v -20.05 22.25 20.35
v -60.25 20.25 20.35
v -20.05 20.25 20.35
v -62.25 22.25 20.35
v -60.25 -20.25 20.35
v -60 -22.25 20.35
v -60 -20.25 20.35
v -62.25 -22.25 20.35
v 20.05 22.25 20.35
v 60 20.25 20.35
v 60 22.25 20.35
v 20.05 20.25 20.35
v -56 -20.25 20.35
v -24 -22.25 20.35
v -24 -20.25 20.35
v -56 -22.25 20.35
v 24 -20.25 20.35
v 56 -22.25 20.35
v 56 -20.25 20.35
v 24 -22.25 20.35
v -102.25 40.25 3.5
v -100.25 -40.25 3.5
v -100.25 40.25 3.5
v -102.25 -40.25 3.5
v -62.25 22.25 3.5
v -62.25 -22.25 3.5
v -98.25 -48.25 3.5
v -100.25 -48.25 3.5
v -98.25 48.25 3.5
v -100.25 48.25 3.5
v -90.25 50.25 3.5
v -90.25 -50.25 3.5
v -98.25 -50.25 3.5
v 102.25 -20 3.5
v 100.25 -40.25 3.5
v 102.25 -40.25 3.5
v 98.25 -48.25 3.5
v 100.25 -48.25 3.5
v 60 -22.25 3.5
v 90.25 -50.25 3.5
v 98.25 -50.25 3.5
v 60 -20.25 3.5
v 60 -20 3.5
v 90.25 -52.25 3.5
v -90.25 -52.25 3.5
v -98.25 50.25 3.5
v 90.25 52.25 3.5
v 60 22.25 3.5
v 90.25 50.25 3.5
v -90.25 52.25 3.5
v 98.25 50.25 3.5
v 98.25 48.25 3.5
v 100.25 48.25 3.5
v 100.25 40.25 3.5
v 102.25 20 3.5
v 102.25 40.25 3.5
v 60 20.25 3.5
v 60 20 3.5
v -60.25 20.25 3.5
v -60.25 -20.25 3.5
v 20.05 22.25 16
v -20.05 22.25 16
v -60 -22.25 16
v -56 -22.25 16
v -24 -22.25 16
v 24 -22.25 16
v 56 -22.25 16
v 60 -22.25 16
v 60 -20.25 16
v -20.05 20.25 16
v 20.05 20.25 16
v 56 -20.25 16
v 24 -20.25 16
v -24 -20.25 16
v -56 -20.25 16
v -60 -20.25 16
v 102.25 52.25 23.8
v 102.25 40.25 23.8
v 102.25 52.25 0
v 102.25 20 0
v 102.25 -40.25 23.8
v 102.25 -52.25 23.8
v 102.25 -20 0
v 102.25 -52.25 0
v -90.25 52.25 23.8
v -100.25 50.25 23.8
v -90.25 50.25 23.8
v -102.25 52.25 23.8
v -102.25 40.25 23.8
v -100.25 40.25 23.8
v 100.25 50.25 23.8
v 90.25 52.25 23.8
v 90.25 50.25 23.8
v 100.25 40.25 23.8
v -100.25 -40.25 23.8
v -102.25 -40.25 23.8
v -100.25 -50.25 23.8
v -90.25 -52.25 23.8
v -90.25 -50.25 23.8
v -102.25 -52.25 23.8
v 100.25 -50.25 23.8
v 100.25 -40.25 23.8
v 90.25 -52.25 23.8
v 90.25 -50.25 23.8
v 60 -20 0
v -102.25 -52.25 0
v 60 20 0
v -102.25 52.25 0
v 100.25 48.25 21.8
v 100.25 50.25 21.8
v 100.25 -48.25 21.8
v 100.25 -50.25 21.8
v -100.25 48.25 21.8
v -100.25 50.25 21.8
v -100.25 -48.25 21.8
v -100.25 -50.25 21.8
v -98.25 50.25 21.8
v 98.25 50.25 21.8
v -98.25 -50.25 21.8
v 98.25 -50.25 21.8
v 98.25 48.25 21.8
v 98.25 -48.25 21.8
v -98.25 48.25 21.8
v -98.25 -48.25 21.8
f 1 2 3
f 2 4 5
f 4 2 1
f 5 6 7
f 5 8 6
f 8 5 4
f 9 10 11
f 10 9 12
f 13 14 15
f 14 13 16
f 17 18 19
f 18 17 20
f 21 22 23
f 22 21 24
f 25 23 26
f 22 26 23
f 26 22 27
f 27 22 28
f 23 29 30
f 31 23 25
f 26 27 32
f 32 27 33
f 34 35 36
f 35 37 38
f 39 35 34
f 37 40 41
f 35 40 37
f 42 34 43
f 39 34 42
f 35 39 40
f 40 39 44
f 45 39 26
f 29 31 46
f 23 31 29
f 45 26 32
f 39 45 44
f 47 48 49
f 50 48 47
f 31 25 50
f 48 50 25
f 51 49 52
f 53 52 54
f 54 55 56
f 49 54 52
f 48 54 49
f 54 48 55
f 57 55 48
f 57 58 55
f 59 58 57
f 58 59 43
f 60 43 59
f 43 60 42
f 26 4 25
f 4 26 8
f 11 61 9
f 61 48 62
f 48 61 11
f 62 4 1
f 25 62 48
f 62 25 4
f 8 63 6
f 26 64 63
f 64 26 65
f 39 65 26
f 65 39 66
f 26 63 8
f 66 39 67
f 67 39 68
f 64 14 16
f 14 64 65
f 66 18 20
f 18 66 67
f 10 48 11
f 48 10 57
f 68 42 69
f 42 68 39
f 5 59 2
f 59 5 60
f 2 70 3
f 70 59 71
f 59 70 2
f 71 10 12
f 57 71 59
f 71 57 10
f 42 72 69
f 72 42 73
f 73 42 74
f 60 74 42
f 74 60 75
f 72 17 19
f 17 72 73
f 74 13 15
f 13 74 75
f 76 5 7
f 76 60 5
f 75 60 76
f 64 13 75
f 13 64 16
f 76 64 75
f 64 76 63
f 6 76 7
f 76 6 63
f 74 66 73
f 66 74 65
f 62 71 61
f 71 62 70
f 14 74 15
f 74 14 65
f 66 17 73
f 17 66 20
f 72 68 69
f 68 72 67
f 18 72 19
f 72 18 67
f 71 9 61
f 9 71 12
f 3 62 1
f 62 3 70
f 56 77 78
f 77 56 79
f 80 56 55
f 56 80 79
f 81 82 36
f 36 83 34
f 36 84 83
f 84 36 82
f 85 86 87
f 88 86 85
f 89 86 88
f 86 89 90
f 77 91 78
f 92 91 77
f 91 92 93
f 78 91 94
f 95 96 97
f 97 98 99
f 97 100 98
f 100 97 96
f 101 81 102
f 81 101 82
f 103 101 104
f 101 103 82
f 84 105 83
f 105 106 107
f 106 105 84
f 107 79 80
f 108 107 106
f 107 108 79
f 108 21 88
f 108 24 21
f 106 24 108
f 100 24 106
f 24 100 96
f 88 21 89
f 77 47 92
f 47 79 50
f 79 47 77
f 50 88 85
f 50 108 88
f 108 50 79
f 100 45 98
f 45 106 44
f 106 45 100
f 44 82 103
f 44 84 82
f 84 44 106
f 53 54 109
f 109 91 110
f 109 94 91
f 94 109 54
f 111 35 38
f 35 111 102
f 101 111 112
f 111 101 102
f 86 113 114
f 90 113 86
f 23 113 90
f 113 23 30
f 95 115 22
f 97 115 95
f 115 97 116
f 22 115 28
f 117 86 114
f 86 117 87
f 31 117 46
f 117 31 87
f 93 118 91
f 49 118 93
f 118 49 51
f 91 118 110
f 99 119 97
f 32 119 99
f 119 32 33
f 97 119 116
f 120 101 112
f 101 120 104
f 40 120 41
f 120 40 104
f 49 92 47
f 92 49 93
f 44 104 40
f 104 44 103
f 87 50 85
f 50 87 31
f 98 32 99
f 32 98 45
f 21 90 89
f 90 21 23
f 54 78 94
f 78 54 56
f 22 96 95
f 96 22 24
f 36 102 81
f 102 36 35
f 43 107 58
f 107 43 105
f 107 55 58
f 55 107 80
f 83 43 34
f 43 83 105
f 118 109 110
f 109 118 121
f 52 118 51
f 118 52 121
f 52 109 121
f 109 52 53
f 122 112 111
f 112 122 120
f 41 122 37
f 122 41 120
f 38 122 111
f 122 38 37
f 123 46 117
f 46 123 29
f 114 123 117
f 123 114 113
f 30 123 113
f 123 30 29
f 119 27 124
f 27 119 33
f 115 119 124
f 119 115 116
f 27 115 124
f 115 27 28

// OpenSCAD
// file: ../parameters.scad
//|==========================================|//
//|               CLOUD CHAMBER              |//
//|==========================================|//


//========== FUNCTIONS ==========//

//unit conversions
function inch_to_mm(inch) = inch*25.4;
function mm_to_inch(mm) = mm/25.4;


//========== SCREWS ==========//

//Screw diameter and nut for M10 [mm]
M10_screw_diameter=10.4;
M10_head_height = 10;
M10_head_diameter = 16+0.5;
M10_nut_height = 10.5;
M10_nut_diameter = 25.5;
M10_nut_pocket = 22.3;

//Screw diameter and nut for M8 [mm]
M8_screw_diameter = 8 + 1;
M8_head_height = 8;
M8_head_diameter = 13.5;
M8_nut_height = 7.5;
M8_nut_diameter = 14.4 + 0.5;
M8_nut_pocket = 13 + 0.5;

//Screw diameter and nut for M6 [mm]
M6_screw_diameter=6.5;
M6_head_diameter = 10+0.5;
M6_head_height = 6;
M6_nut_height = 4.9;
M6_nut_diameter = 11.8;
M6_nut_pocket = 10.4;

//Screw diameter and nut for M5 [mm]
M5_screw_diameter=5.5;
M5_head_height = 5;
M5_head_diameter = 13+0.5;
M5_nut_height = 4.5;
M5_nut_diameter = 9.4;
M5_nut_pocket = 8.4;

//Screw diameter and nut for M4 [mm]
M4_screw_diameter=4.5;
M4_screw_head_height = 4;
M4_nut_height = 3.2;
M4_nut_diameter = 8.4;
M4_nut_pocket = 7.5;

//Screw diameter and nut for M3 [mm]
M3_screw_diameter = 3.2;
M3_nut_height = 2.7;
M3_nut_diameter = 6.6;
M3_screw_head_height = 3;
M3_nut_pocket = 5.6;

//Screw diameter and nut for M2,5 [mm]
M2_5_screw_diameter = 2.7;
M2_5_nut_height = 2.3;
M2_5_nut_diameter = 6;
M2_5_nut_pocket = 5.1;


//========== CHAMBER ==========//

//observation_surface_x
observation_surface_x = 200.5;
observation_surface_y = 100.5;

//cooper block
cooper_block_x = 200;
cooper_block_y = 100;
cooper_block_thickness = 8;

//chamber frame
chamber_width = 400;
chamber_deepth = 350;
chamber_height = 250;

//service door
door_width = 200;

//peltiers
peltier_size_x = 40;
peltier_size_y = 40;
peltier_thickness = 2.9;
peltier_cable_diameter = 4;

//water ALU block
water_block_width = 40;
water_block_length = 120;
water_block_thickness = 12.5;

//hose
hose_outer_diameter = 10;
hose_inner_diameter = 8;

//nextion display 2.8"
nextion_board_width = 85;
nextion_board_height = 50;
nextion_board_thickness = 1.6;
nextion_display_width = 69.5;
nextion_display_height = 50;
nextion_thickness = 7;
nextion_screw_diameter = M2_5_screw_diameter;
nextion_screw_width_distance = 78.5;
nextion_screw_height_distance = 49;


//========== ALU PROFILES ==========//

//30x30 profile
ALU30_size = 30;
ALU30_groove = 8;

//20x20 profile
ALU20_size = 20;
ALU20_groove = 6;


//========== ELECTRONIC DEVICE ==========//

//TO-92 package
TO92_width = 4.6;
TO92_height = 4.6;
TO92_thickness = 3.9;
TO92_pins = 14.5;
TO92_bottom_to_pins = 1;


//========== COOLING CIRCUIT ==========//

//fitting
fitting_thread_diameter = 13.157;
fitting_thread_height = 4;
fitting_height = 14.5;
fitting_inner_diameter = 8.4;
fitting_bottom_inner_diameter = 10;
fitting_bottom_inner_height = 6;
fitting_wall_thickness = 0.8;
fitting_overhang_height = 5;
fitting_overhang_size = 1;
fitting_nut_diameter = 18;
fitting_nut_height = 3;
fitting_seal_thickness = 0.8;

//pump
pump_diameter = 70;
pump_height = 135;
pump_in_out_distance = 35;
pump_in_out_diameter = 20;
pump_in_out_height = 40;
pump_in_out_overlap = 2;
pump_cap_diameter = 16;
pump_cap_height = 2;
pump_cap_distance = 30;
pump_cap_inbus_diameter = 7;
pump_cap_inbus_height = 5;
pump_cap_angle = 35;
pump_tank_height = 60;
pump_tank_top_distance = 16;
pump_tank_furrow_height = 0.5;
pump_tank_furrow_deepth = 2;

//fan
fan_size = 120;
fan_thickness = 25;
fan_frame_thickness = 5;
fan_diameter = fan_size-2;
fan_center_diameter = 35;
fan_blade_count = 5;
fan_blade_center_size = 5;
fan_blade_outer_size = 45;
fan_blade_angle = 23;
fan_blade_thickness = 0.4;
fan_screw_diameter = M4_screw_diameter;
fan_screw_distance = 7;
fan_rotation = false;

//radiator
radiator_width = 392;
radiator_height = 120;
radiator_thickness = 27;
radiator_fpi = 16;
radiator_fin_thickness = 0.05;
radiator_frame_thickness = 2;
radiator_frame_overhang = 4;
radiator_frame_radius = 10;
radiator_fans_translate = 17-fan_screw_distance;
radiator_pipe_count = 12;
radiator_pipe_thickness = 2;
radiator_mount_height = 12;
radiator_mount_width = 31;
radiator_mount_thickness = 1;
// main file
include <../parameters.scad>

bottom_thickness = 3.5;
border_thickness = 2;
border_height = water_block_thickness+peltier_thickness*2+2;
border_corner_size = 10;
copper_plate_support = 2;
water_block_tolerance = 0.5;

module 1001_Pbk(peltiers=false) {
    if(peltiers==true) {
        translate([0, 0, bottom_thickness+water_block_thickness/2])
            #cube([water_block_length, water_block_width, water_block_thickness], center=true);

        translate([-water_block_length/2+peltier_size_x/2, 0, bottom_thickness+water_block_thickness+peltier_thickness])
            #cube([peltier_size_x, peltier_size_y, peltier_thickness*2], center=true);

        translate([water_block_length/2-peltier_size_x/2, 0, bottom_thickness+water_block_thickness+peltier_thickness])
            #cube([peltier_size_x, peltier_size_y, peltier_thickness*2], center=true);
    }

    translate([observation_surface_x/2-copper_plate_support, observation_surface_y/2-copper_plate_support, bottom_thickness])
        cube([copper_plate_support, copper_plate_support, water_block_thickness+peltier_thickness*2]);

    translate([observation_surface_x/2-copper_plate_support, -observation_surface_y/2, bottom_thickness])
        cube([copper_plate_support, copper_plate_support, water_block_thickness+peltier_thickness*2]);

    translate([-observation_surface_x/2, observation_surface_y/2-copper_plate_support, bottom_thickness])
        cube([copper_plate_support, copper_plate_support, water_block_thickness+peltier_thickness*2]);

    translate([-observation_surface_x/2, -observation_surface_y/2, bottom_thickness])
        cube([copper_plate_support, copper_plate_support, water_block_thickness+peltier_thickness*2]);

    difference() {
        translate([0, 0, bottom_thickness+(water_block_thickness+peltier_thickness*1.5)/2]) {
            cube([water_block_length+border_thickness*2+water_block_tolerance, water_block_width+border_thickness*2+water_block_tolerance, water_block_thickness+peltier_thickness*1.5], center=true);
        }

        translate([water_block_length/2, -water_block_width, 0])
            cube([100, water_block_width*2, 100]);

        translate([0, 0 ,bottom_thickness+50])
            cube([water_block_length+water_block_tolerance, water_block_width+water_block_tolerance, 100], center=true);

        translate([-water_block_length/2, -water_block_width/2-water_block_tolerance/2-border_thickness-0.1, bottom_thickness+water_block_thickness])
            cube([peltier_cable_diameter, border_thickness*2, 20]);

        translate([-water_block_length/2+peltier_size_x-peltier_cable_diameter, -water_block_width/2-water_block_tolerance/2-border_thickness-0.1, bottom_thickness+water_block_thickness])
            cube([peltier_cable_diameter, border_thickness*2, 20]);

        translate([water_block_length/2-peltier_size_x, -water_block_width/2-water_block_tolerance/2-border_thickness-0.1, bottom_thickness+water_block_thickness])
            cube([peltier_cable_diameter, border_thickness*2, 20]);

        translate([water_block_length/2-peltier_cable_diameter, -water_block_width/2-water_block_tolerance/2-border_thickness-0.1, bottom_thickness+water_block_thickness])
            cube([peltier_cable_diameter, border_thickness*2, 20]);

        translate([0, 0, 50+bottom_thickness+water_block_thickness])
            cube([water_block_length/3+0.1, water_block_width*2, 100], center=true);
    }

    difference() {
        union() {
            translate([0, 0, (bottom_thickness+border_height)/2])
                cube([observation_surface_x+border_thickness*2, observation_surface_y+border_thickness*2, bottom_thickness+border_height], center=true);

            
        }

        translate([0, 0, bottom_thickness+50])
            cube([observation_surface_x, observation_surface_y, 100], center=true);

        translate([0, 0, bottom_thickness+50])
            cube([observation_surface_x-border_corner_size*2, observation_surface_y*2, 100], center=true);

        translate([0, 0, bottom_thickness+50])
            cube([observation_surface_x*2, observation_surface_y-border_corner_size*2, 100], center=true);

        translate([water_block_length/2+observation_surface_x/2, 0, 0])
            cube([observation_surface_x, water_block_width, bottom_thickness*3], center=true);
    }
}

1001_Pbk();
